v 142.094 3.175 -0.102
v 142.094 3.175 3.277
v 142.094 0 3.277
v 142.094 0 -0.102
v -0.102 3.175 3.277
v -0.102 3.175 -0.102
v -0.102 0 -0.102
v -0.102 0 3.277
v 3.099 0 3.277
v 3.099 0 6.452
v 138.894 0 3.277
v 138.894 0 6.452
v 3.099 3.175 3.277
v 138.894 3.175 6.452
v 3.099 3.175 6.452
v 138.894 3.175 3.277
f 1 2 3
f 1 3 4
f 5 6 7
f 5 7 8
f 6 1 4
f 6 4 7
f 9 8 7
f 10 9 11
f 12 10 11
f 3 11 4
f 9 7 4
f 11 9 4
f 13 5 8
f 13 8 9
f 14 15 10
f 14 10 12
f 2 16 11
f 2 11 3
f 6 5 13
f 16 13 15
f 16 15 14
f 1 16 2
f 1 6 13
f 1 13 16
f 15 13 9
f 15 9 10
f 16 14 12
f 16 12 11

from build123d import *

# Parameters (mm, degrees)
BOSS_EXTRUDE1_DEPTH = 3.175
BOSS_EXTRUDE3_DEPTH = 3.175


with BuildPart() as part:
    # Sketch2 → Boss-Extrude1 (new body)
    with BuildSketch(Plane(origin=(0, 0, 0), x_dir=(1, 0, 0), z_dir=(0, 1, 0))):
        Polygon((3.2004, -6.35), (138.79195, -6.35), (138.79195, -3.175), (141.99235, -3.175), (141.99235, 0), (0, 0), (0, -3.175), (3.2004, -3.175), align=None)
    extrude(amount=BOSS_EXTRUDE1_DEPTH)

    # Sketch4 → Boss-Extrude3 (add)
    with BuildSketch(Plane(origin=(0, 3.175, 0), x_dir=(1, 0, 0), z_dir=(0, 1, 0))):
        Polygon((142.09395, -3.2766), (142.09395, 0.1016), (-0.1016, 0.1016), (-0.1016, -3.2766), (3.0988, -3.2766), (3.0988, -6.4516), (138.89355, -6.4516), (138.89355, -3.2766), align=None)
    extrude(amount=-BOSS_EXTRUDE3_DEPTH)


solid = part.part
